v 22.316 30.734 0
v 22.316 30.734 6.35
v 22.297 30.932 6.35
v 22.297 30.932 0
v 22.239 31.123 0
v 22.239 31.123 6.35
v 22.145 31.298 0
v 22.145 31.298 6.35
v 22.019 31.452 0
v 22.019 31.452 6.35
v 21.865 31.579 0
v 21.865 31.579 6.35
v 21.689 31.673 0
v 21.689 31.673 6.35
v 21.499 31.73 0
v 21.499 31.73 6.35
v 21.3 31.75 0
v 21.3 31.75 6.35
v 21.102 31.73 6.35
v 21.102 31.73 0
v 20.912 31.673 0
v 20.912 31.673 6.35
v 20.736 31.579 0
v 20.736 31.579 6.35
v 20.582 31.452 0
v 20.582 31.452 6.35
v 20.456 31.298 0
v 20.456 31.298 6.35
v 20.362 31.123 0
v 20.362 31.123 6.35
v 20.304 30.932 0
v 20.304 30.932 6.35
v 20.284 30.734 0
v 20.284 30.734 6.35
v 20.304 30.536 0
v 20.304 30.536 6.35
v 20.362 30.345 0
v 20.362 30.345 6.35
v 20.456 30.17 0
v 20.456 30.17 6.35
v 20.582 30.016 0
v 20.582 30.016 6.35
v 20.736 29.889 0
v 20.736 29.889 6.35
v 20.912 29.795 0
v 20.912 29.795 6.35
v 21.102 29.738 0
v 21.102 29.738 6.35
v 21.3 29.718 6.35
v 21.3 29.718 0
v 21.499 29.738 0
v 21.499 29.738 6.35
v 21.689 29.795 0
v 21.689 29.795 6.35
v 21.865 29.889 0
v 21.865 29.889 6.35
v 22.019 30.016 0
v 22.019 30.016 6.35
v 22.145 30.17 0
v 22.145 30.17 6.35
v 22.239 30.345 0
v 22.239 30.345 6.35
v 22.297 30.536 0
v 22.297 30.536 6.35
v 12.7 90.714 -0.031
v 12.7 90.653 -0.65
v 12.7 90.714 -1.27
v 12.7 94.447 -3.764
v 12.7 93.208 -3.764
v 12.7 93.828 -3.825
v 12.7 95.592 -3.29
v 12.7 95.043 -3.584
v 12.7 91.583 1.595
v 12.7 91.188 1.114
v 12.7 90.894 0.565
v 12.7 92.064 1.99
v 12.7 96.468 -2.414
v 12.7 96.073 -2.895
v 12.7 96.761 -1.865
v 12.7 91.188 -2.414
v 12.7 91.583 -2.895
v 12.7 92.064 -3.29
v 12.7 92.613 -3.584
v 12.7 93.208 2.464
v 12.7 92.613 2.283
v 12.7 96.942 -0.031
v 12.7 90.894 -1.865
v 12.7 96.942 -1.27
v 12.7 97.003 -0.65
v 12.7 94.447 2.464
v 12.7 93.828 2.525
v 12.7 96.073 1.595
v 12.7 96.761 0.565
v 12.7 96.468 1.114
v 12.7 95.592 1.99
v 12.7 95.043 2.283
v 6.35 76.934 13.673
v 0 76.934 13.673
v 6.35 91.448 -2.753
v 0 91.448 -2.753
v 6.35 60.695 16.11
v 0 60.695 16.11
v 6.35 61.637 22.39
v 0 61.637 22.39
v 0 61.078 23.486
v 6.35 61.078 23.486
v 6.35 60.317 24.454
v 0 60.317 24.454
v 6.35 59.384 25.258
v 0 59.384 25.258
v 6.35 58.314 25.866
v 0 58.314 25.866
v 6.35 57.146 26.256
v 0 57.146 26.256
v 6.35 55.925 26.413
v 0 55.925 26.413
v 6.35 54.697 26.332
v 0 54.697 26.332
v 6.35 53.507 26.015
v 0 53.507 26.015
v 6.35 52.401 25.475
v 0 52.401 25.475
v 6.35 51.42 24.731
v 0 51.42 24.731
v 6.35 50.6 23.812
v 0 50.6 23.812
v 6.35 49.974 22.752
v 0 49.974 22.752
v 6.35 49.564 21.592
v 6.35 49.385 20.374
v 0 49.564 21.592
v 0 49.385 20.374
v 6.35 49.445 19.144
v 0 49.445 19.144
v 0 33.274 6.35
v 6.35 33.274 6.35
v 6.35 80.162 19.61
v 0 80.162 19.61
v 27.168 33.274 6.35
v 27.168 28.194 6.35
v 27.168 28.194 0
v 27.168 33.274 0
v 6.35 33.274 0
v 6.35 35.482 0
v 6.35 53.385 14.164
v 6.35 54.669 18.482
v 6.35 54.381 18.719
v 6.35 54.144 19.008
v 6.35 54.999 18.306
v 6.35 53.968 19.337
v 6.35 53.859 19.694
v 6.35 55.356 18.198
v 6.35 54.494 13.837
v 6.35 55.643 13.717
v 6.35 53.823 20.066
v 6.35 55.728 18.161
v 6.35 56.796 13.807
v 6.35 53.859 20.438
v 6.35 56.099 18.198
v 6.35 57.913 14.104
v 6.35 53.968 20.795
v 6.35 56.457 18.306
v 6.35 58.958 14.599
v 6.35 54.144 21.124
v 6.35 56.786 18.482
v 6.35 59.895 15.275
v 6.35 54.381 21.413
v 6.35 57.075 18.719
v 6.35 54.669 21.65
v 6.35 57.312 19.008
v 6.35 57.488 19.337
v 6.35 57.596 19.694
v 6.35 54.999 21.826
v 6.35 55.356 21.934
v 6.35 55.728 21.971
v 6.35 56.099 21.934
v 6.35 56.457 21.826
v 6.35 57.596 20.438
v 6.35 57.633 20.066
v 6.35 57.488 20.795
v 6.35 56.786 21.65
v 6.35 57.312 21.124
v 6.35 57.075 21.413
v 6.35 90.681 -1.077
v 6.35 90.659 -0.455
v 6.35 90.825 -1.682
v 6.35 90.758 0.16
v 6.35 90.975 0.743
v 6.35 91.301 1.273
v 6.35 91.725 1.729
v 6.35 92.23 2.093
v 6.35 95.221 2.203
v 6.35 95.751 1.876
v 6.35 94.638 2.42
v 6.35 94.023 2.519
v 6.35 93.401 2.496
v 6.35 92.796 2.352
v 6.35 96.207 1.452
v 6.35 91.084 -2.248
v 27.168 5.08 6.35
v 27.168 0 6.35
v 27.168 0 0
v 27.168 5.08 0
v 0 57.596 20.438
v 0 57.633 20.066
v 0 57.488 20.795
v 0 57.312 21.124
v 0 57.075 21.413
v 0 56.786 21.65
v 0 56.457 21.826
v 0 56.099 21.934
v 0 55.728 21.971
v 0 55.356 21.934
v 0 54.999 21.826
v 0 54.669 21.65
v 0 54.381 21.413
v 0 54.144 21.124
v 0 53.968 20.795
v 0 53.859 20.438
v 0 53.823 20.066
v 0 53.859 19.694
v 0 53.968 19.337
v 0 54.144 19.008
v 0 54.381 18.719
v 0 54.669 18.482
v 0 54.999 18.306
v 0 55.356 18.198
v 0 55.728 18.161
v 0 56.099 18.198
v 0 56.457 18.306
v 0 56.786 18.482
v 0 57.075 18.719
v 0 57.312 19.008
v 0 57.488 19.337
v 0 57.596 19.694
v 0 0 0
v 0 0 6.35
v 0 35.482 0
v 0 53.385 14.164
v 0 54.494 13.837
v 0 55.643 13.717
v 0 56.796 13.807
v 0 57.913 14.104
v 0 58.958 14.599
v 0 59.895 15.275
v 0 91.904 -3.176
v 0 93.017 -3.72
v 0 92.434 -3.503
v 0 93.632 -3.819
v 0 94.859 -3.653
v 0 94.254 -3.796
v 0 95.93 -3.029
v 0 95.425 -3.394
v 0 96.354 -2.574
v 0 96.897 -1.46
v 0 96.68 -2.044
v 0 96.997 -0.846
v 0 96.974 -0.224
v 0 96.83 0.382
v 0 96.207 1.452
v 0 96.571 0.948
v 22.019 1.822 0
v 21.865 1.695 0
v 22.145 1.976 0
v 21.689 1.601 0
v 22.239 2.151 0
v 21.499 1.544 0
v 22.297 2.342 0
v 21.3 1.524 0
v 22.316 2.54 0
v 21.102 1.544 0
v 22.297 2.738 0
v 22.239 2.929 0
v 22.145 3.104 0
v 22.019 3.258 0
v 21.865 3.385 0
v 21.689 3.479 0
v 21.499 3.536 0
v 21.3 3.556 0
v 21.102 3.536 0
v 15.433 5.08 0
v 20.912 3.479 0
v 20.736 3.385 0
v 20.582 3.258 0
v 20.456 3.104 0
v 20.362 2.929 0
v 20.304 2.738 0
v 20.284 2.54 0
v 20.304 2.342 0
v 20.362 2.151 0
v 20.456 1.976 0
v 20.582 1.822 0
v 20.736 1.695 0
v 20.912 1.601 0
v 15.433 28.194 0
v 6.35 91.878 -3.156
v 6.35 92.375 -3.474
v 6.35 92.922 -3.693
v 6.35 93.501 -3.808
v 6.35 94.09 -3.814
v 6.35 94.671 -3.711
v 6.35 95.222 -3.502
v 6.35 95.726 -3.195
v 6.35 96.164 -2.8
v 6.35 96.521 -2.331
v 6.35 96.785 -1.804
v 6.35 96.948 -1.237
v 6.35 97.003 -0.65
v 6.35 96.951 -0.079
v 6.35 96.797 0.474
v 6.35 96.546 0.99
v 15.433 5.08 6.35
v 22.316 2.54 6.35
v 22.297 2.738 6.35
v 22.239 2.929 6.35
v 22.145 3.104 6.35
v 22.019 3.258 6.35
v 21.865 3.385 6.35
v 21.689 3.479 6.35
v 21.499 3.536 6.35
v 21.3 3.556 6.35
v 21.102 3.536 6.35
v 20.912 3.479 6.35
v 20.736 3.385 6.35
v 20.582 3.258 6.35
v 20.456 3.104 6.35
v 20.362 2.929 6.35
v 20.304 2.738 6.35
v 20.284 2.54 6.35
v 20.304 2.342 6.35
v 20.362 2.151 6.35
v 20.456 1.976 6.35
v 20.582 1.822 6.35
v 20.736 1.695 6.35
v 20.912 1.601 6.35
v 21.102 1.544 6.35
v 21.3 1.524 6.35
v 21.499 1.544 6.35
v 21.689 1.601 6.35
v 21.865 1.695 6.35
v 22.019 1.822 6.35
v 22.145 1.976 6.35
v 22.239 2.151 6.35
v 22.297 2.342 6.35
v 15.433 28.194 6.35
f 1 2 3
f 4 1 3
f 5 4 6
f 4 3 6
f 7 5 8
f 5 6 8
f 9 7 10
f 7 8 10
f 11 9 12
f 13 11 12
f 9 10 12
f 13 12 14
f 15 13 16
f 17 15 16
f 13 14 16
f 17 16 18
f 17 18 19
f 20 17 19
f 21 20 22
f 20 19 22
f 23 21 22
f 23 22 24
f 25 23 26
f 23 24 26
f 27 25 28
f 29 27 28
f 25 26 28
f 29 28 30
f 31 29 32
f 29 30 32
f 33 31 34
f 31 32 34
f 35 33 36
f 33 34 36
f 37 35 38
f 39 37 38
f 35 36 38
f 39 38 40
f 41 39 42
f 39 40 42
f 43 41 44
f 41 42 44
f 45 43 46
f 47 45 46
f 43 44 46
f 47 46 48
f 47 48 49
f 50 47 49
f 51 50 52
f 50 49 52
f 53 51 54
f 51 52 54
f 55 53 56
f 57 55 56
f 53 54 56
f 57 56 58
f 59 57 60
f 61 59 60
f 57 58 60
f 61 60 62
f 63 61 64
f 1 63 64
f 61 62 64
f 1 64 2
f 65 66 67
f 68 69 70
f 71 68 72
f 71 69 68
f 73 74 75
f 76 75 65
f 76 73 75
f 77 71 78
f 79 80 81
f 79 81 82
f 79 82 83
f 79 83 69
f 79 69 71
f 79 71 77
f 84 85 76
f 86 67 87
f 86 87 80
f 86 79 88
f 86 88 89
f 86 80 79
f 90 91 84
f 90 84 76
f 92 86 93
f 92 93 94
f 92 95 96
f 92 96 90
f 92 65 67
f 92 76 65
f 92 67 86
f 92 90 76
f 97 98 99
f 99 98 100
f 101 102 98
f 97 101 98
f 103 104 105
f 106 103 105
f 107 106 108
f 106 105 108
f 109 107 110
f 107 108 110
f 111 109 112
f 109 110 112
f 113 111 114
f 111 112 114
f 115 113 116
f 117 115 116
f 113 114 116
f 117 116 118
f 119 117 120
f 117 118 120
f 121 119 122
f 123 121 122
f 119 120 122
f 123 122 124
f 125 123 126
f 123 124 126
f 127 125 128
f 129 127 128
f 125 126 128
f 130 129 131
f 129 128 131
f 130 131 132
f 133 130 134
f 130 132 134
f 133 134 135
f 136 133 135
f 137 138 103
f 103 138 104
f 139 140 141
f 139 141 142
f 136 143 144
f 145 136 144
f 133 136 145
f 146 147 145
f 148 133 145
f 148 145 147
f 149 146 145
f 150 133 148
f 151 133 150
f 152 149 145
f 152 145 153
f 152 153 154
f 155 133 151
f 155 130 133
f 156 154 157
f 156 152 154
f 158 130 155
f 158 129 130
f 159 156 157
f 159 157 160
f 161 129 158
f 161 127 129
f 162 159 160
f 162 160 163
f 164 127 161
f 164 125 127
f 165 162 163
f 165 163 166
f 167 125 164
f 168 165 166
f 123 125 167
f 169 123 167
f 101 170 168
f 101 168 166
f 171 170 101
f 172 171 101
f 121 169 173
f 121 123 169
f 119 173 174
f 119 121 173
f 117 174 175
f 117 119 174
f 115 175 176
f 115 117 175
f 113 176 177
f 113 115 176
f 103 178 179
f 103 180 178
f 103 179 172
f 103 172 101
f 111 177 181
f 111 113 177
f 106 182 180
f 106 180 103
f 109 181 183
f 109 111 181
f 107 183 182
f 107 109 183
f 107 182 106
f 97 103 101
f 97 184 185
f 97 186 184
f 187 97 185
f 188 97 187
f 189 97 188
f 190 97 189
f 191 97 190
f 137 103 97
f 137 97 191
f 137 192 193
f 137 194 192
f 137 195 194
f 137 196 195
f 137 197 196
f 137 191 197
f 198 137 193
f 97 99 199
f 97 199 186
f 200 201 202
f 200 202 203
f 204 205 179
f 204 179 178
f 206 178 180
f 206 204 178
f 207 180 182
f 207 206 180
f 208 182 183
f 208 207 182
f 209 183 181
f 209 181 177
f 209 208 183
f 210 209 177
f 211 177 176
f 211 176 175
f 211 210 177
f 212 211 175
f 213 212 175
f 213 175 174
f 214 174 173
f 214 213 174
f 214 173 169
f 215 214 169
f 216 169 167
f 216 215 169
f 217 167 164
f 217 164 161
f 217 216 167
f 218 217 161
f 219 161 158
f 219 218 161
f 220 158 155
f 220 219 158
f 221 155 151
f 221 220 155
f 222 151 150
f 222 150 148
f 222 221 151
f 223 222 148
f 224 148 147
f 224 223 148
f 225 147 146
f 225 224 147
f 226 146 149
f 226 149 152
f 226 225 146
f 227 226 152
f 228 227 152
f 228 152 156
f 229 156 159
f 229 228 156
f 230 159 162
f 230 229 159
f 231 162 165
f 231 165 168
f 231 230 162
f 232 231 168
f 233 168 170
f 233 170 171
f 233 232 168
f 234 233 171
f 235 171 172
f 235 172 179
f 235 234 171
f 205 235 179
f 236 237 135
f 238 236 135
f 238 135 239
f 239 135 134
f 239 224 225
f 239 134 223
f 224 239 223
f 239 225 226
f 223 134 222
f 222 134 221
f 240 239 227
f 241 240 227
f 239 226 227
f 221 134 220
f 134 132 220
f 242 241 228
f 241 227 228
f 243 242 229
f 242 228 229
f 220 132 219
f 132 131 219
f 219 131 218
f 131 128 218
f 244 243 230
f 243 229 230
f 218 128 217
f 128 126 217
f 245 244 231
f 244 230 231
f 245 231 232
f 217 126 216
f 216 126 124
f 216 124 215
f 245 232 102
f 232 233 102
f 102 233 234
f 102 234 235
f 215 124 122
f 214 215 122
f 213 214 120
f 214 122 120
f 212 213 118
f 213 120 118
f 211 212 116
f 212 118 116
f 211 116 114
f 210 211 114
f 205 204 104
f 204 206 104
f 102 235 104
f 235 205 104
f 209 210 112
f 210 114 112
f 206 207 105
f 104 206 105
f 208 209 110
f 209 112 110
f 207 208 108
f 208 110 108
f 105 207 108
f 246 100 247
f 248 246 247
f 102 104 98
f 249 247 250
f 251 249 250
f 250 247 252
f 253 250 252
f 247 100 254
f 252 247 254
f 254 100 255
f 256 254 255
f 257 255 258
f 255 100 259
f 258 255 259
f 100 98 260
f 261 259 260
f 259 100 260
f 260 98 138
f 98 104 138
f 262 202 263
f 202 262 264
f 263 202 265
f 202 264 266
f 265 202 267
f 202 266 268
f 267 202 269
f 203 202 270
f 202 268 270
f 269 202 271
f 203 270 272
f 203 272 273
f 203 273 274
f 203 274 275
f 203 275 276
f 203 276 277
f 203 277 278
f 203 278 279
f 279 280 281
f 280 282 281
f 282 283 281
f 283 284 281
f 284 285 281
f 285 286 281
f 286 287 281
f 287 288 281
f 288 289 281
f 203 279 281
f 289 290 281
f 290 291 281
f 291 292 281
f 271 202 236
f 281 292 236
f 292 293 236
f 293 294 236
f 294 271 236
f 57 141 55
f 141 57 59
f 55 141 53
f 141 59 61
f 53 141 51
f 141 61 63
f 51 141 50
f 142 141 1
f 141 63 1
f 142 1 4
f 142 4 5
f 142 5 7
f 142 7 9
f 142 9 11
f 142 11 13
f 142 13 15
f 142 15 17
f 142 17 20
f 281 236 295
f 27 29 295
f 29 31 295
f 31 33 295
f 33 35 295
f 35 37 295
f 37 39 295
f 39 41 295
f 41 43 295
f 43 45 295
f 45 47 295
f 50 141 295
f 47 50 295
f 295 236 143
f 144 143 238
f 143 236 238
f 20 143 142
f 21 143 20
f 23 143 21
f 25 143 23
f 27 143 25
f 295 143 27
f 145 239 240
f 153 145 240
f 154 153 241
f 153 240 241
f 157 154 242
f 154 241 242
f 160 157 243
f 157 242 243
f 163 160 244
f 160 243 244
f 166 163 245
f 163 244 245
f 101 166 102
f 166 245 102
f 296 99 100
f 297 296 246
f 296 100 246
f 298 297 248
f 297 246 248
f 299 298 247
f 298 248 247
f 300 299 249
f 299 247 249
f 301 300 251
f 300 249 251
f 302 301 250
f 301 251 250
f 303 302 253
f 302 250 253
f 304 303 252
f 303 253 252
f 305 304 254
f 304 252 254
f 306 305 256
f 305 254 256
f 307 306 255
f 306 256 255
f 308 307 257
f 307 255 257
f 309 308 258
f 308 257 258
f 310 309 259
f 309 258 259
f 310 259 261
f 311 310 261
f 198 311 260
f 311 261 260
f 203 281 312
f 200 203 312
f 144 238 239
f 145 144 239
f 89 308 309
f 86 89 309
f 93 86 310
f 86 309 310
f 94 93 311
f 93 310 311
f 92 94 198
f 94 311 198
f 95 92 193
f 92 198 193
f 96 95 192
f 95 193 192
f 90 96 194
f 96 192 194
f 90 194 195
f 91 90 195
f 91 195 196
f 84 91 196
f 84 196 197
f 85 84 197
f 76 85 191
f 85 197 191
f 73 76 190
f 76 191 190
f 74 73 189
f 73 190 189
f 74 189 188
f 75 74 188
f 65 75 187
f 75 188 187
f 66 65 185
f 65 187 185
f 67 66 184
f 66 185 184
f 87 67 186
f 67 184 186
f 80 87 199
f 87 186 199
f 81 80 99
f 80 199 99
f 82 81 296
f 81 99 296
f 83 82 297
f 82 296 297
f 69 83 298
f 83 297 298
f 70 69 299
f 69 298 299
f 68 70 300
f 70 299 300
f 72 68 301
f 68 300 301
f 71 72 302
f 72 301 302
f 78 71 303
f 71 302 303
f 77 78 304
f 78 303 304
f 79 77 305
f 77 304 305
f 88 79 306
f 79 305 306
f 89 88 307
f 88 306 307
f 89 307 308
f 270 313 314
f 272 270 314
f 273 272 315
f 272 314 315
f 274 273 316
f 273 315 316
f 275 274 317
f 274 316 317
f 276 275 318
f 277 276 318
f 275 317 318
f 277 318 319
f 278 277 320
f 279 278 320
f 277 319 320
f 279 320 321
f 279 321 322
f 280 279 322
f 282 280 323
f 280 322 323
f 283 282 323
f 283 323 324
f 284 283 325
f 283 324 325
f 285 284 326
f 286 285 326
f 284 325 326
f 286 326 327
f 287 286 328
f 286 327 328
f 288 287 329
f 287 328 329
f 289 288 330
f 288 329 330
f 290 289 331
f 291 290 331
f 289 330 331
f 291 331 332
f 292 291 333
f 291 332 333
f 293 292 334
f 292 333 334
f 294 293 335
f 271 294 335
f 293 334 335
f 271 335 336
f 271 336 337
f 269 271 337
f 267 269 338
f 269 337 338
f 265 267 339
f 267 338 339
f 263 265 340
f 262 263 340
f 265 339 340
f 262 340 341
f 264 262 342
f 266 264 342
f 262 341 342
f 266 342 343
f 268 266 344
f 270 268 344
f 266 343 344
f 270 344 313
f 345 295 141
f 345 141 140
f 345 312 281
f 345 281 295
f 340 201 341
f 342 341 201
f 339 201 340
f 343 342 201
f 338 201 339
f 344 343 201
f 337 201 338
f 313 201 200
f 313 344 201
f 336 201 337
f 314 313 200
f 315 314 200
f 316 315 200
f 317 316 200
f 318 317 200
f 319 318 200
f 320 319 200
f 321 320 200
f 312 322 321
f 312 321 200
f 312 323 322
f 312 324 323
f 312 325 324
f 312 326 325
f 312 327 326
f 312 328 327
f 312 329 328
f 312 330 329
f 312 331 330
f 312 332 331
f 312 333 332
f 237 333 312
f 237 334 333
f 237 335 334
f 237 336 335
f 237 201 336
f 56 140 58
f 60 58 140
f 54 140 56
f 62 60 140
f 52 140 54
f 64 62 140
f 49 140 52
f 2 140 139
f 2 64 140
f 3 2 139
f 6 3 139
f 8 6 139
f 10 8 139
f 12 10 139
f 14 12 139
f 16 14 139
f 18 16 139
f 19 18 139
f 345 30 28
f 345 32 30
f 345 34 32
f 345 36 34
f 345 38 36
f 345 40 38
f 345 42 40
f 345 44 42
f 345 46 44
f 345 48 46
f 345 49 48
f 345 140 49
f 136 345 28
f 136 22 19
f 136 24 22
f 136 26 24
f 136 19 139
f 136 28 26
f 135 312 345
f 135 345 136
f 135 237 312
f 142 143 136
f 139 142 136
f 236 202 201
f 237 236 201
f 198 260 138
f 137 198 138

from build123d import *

# Parameters (mm, degrees)
F0_R     = 1.905
F1_DEPTH = 6.35
F2_R     = 3.175
F3_DEPTH = 6.35
F4_W     = 33.274
F4_H     = 6.35
F5_DEPTH = 9.08304
F6_W     = 5.08
F6_H     = 6.35
F7_DEPTH = 11.7348
F8_R     = 1.016
F9_DEPTH = 6.35


with BuildPart() as f1:
    # F0 (on Right) → F1 (new body)
    with BuildSketch(Plane.YZ):
        with BuildLine():
            Line((0, 6.35), (0, 0))
            Line((0, 0), (35.482188, 0))
            Line((35.482188, 0), (53.384841, 14.163968))
            ThreePointArc((53.384841, 14.163968), (57.36122, 13.929732), (60.694788, 16.110049))
            Line((60.694788, 16.110049), (76.933658, 13.673165))
            Line((76.933658, 13.673165), (91.448403, -2.752631))
            ThreePointArc((91.448403, -2.752631), (95.929991, -3.029437), (96.206797, 1.452151))
            Line((96.206797, 1.452151), (80.161637, 19.60986))
            Line((80.161637, 19.60986), (61.637148, 22.389735))
            ThreePointArc((61.637148, 22.389735), (54.09398, 26.202268), (49.444911, 19.143872))
            Line((49.444911, 19.143872), (33.274, 6.35))
            Line((33.274, 6.35), (0, 6.35))
        make_face()
        with Locations((55.7276, 20.066)):
            Circle(F0_R, mode=Mode.SUBTRACT)
    extrude(amount=F1_DEPTH)

    # F2 (on face) → F3 (join)
    with BuildSketch(Plane.YZ.offset(6.35)):
        with Locations((93.8276, -0.65024)):
            Circle(F2_R)
    extrude(amount=F3_DEPTH)

    # F4 (on face) → F5 (join)
    with BuildSketch(Plane.YZ.offset(6.35)):
        with Locations((16.637, 3.175)):
            Rectangle(F4_W, F4_H)
    extrude(amount=F5_DEPTH)

    # F6 (on face) → F7 (join)
    with BuildSketch(Plane.YZ.offset(15.43304)):
        with Locations((2.54, 3.175)):
            Rectangle(F6_W, F6_H)
        with Locations((30.734, 3.175)):
            Rectangle(F6_W, F6_H)
    extrude(amount=F7_DEPTH)

    # F8 (on face) → F9 (cut, through all)
    with BuildSketch(Plane.XY.offset(6.35)):
        with Locations((21.30044, 30.734)):
            Circle(F8_R)
        with Locations((21.30044, 2.54)):
            Circle(F8_R)
    extrude(amount=-F9_DEPTH, mode=Mode.SUBTRACT)


solid = f1.part
